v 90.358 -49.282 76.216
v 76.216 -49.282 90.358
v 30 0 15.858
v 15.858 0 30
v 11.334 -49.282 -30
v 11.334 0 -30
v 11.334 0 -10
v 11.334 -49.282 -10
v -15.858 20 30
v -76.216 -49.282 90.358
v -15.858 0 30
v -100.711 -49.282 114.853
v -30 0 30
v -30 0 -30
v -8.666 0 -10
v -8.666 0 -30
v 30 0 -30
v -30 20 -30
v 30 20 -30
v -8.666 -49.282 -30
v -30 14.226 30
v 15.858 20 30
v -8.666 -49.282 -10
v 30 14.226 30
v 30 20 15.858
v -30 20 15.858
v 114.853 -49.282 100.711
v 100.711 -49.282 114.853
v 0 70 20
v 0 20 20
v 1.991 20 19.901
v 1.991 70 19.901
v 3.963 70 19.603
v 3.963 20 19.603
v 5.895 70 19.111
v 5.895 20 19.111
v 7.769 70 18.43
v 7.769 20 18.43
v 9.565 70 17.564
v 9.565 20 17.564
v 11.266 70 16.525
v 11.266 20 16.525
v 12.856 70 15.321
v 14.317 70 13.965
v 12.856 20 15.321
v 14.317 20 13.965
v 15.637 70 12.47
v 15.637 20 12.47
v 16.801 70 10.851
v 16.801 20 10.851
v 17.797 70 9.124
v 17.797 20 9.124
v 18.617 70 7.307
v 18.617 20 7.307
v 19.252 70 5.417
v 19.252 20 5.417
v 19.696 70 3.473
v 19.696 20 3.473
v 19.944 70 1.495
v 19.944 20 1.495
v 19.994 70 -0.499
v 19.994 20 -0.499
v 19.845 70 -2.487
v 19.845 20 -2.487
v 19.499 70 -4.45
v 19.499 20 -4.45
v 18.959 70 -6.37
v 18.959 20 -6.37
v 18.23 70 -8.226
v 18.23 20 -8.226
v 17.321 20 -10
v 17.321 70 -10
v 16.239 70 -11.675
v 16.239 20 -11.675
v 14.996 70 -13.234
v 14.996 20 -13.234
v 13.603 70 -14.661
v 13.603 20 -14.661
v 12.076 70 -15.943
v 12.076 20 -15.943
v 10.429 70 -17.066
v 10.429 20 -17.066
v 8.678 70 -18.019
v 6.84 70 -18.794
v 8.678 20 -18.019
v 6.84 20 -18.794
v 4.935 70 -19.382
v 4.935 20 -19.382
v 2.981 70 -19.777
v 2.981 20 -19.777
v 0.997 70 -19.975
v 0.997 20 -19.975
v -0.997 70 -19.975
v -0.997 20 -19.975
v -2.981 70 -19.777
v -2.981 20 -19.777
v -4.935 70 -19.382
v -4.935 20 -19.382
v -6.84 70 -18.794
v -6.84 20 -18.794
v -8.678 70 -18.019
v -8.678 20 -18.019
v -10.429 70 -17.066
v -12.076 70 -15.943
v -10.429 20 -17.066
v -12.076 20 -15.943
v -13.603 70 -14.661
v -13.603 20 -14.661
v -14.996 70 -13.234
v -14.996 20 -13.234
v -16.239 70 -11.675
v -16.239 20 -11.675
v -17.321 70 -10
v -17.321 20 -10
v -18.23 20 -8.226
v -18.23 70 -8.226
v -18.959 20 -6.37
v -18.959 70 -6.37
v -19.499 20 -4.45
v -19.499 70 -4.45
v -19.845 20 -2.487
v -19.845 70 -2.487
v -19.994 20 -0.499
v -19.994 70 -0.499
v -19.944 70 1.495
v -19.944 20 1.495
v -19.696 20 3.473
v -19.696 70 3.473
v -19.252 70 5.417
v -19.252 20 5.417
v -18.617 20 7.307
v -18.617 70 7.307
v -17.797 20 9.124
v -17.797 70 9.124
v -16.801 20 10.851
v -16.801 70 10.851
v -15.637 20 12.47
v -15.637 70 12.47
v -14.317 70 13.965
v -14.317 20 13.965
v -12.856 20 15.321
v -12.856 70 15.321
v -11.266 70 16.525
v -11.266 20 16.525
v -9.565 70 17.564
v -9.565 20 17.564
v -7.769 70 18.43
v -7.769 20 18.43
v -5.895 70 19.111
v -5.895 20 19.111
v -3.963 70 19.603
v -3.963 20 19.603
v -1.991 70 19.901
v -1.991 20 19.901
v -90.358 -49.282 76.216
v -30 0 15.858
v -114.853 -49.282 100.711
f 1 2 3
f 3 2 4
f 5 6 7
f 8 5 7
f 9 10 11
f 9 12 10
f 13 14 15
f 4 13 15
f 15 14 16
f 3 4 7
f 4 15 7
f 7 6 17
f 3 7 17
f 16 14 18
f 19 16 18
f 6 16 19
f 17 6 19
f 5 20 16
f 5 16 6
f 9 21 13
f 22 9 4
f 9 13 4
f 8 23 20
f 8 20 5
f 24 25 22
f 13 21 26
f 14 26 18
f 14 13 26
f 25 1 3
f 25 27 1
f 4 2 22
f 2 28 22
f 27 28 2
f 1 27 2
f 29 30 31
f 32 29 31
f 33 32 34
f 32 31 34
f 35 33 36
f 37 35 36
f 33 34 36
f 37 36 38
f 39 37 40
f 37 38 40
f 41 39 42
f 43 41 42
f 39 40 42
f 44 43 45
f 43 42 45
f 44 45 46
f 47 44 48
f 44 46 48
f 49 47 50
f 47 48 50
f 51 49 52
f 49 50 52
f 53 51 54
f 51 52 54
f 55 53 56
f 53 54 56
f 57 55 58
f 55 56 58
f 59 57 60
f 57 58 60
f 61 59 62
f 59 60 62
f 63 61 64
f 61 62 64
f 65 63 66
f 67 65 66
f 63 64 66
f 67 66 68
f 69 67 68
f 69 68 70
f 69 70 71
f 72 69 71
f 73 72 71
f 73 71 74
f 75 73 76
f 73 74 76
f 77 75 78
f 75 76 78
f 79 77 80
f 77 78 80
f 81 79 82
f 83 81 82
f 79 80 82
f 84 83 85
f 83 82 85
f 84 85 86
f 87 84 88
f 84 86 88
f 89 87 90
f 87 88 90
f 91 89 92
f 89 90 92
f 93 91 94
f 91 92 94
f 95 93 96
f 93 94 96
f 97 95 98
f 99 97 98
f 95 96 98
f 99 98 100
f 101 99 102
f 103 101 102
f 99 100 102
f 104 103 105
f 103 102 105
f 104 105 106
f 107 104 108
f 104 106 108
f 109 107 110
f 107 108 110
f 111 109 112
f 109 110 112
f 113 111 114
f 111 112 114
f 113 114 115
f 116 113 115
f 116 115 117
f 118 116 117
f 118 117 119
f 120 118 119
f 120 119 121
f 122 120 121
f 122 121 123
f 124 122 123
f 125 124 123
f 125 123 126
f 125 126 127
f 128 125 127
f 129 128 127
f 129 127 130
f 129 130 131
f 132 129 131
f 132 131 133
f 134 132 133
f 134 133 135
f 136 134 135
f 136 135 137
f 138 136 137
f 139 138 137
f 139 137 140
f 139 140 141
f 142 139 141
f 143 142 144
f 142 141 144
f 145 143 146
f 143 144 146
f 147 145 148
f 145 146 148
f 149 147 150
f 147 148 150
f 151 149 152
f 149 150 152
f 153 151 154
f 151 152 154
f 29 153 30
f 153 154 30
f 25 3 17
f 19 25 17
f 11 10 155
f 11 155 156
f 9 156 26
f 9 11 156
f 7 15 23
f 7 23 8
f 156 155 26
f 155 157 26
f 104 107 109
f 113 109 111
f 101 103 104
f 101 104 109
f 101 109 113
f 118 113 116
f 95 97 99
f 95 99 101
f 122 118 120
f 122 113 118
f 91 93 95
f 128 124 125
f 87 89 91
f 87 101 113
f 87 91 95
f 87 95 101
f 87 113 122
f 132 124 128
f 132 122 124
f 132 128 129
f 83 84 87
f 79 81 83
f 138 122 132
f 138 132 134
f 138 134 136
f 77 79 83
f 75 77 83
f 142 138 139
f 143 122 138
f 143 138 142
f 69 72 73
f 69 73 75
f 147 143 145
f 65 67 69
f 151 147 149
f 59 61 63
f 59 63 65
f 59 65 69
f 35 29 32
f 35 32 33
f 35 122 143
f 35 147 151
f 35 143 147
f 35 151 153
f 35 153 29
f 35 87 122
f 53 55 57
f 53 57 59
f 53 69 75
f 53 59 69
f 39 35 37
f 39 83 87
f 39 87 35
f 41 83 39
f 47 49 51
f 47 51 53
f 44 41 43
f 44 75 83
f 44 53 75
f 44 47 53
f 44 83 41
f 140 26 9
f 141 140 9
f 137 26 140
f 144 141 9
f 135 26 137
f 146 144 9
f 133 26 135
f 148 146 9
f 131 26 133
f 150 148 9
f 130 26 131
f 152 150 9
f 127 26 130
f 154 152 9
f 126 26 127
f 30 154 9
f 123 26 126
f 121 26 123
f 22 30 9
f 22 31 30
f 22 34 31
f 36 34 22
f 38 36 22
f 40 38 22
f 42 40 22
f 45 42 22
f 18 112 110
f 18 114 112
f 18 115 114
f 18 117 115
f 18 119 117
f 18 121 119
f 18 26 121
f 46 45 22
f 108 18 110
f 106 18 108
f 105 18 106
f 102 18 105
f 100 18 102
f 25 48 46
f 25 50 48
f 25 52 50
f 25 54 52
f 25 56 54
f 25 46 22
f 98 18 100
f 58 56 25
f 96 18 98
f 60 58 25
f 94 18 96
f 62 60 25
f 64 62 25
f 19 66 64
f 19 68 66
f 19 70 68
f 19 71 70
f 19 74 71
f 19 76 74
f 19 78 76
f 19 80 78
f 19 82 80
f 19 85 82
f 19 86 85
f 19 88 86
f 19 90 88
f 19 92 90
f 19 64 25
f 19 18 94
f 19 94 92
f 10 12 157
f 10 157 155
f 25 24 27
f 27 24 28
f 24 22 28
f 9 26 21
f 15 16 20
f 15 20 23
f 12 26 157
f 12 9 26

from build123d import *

# Parameters (mm, degrees)
SKETCH2_W           = 60
SKETCH2_H           = 60
SKETCH2_R           = 20
BOSS_EXTRUDE3_DEPTH = 20
BOSS_EXTRUDE5_START = 20
SKETCH2_4_R         = 20
BOSS_EXTRUDE5_DEPTH = 50
BOSS_EXTRUDE6_DEPTH = 10
CUT_EXTRUDE2_DEPTH  = 10
CUT_EXTRUDE3_DEPTH  = 10
SKETCH13_W          = 20
SKETCH13_H          = 20
BOSS_EXTRUDE8_DEPTH = 49.282032303


with BuildPart() as part:
    # Sketch2 → Boss-Extrude3 (new body)
    # profile 1 of 2: a face of its own
    with BuildSketch(Plane(origin=(0, 0, 0), x_dir=(1, 0, 0), z_dir=(0, 1, 0))):
        Rectangle(SKETCH2_W, SKETCH2_H)
        Circle(SKETCH2_R, mode=Mode.SUBTRACT)
    # profile 2 of 2: a face of its own
    with BuildSketch(Plane(origin=(0, 0, 0), x_dir=(1, 0, 0), z_dir=(0, 1, 0))):
        Circle(SKETCH2_R)
    extrude(amount=BOSS_EXTRUDE3_DEPTH)

    # Sketch2<4> → Boss-Extrude5 (add)
    with BuildSketch(Plane(origin=(0, 0, 0), x_dir=(1, 0, 0), z_dir=(0, 1, 0)).offset(BOSS_EXTRUDE5_START)):
        with Locations(Location((0, 0, 0), (0, 0, 270))):
            Circle(SKETCH2_4_R)
    extrude(amount=BOSS_EXTRUDE5_DEPTH)


with BuildPart() as body_2:
    # Sketch5 → Boss-Extrude6 (new, symmetric)
    with BuildSketch(Plane(origin=(0, 0, 0), x_dir=(0.7071067811865472, 0, -0.7071067811865478), z_dir=(0.7071067811865478, 0, 0.7071067811865472))):
        Polygon((-32.426406871, 20), (-152.426406871, -49.282032303), (-117.78539072, -49.282032303), (-32.426406871, 0), align=None)
    boss_extrude6 = extrude(amount=BOSS_EXTRUDE6_DEPTH, both=True)


with BuildPart() as part_1:
    add(part.part)

    # Mirror3: Boss-Extrude6 across plane
    add(boss_extrude6.mirror(Plane(origin=(0, 0, 0), x_dir=(0, 0, 1), z_dir=(1, 0, 0))))

    # Sketch11 → Cut-Extrude2 (cut)
    with BuildSketch(Plane(origin=(11.855957404, 29.041046052, 11.855957404), x_dir=(0.9259415151999266, -0.2703581015304675, -0.2637021186227093), z_dir=(0.3535533905932722, 0.8660254037844398, 0.3535533905932724))):
        Polygon((1.365229379, -20.617909778), (18.189330993, -9.803585716), (18.189330993, -28.29757562), align=None)
    extrude(amount=CUT_EXTRUDE2_DEPTH, mode=Mode.SUBTRACT)

    # Sketch12 → Cut-Extrude3 (cut)
    with BuildSketch(Plane(origin=(-11.855957404, 29.041046052, 11.855957404), x_dir=(0.9259415151999266, 0.2703581015304675, 0.2637021186227093), z_dir=(-0.3535533905932722, 0.8660254037844398, 0.3535533905932724))):
        Polygon((-93.113165887, -126.364380861), (-76.289064273, -137.178704922), (-1.365229379, -20.617909778), (-18.189330993, -9.803585716), align=None)
    extrude(amount=CUT_EXTRUDE3_DEPTH, mode=Mode.SUBTRACT)

    # Sketch13 → Boss-Extrude8 (add)
    with BuildSketch(Plane.XZ):
        with Locations((1.334047935, -20)):
            Rectangle(SKETCH13_W, SKETCH13_H)
    extrude(amount=BOSS_EXTRUDE8_DEPTH)


solid = Compound([body_2.part, part_1.part])
